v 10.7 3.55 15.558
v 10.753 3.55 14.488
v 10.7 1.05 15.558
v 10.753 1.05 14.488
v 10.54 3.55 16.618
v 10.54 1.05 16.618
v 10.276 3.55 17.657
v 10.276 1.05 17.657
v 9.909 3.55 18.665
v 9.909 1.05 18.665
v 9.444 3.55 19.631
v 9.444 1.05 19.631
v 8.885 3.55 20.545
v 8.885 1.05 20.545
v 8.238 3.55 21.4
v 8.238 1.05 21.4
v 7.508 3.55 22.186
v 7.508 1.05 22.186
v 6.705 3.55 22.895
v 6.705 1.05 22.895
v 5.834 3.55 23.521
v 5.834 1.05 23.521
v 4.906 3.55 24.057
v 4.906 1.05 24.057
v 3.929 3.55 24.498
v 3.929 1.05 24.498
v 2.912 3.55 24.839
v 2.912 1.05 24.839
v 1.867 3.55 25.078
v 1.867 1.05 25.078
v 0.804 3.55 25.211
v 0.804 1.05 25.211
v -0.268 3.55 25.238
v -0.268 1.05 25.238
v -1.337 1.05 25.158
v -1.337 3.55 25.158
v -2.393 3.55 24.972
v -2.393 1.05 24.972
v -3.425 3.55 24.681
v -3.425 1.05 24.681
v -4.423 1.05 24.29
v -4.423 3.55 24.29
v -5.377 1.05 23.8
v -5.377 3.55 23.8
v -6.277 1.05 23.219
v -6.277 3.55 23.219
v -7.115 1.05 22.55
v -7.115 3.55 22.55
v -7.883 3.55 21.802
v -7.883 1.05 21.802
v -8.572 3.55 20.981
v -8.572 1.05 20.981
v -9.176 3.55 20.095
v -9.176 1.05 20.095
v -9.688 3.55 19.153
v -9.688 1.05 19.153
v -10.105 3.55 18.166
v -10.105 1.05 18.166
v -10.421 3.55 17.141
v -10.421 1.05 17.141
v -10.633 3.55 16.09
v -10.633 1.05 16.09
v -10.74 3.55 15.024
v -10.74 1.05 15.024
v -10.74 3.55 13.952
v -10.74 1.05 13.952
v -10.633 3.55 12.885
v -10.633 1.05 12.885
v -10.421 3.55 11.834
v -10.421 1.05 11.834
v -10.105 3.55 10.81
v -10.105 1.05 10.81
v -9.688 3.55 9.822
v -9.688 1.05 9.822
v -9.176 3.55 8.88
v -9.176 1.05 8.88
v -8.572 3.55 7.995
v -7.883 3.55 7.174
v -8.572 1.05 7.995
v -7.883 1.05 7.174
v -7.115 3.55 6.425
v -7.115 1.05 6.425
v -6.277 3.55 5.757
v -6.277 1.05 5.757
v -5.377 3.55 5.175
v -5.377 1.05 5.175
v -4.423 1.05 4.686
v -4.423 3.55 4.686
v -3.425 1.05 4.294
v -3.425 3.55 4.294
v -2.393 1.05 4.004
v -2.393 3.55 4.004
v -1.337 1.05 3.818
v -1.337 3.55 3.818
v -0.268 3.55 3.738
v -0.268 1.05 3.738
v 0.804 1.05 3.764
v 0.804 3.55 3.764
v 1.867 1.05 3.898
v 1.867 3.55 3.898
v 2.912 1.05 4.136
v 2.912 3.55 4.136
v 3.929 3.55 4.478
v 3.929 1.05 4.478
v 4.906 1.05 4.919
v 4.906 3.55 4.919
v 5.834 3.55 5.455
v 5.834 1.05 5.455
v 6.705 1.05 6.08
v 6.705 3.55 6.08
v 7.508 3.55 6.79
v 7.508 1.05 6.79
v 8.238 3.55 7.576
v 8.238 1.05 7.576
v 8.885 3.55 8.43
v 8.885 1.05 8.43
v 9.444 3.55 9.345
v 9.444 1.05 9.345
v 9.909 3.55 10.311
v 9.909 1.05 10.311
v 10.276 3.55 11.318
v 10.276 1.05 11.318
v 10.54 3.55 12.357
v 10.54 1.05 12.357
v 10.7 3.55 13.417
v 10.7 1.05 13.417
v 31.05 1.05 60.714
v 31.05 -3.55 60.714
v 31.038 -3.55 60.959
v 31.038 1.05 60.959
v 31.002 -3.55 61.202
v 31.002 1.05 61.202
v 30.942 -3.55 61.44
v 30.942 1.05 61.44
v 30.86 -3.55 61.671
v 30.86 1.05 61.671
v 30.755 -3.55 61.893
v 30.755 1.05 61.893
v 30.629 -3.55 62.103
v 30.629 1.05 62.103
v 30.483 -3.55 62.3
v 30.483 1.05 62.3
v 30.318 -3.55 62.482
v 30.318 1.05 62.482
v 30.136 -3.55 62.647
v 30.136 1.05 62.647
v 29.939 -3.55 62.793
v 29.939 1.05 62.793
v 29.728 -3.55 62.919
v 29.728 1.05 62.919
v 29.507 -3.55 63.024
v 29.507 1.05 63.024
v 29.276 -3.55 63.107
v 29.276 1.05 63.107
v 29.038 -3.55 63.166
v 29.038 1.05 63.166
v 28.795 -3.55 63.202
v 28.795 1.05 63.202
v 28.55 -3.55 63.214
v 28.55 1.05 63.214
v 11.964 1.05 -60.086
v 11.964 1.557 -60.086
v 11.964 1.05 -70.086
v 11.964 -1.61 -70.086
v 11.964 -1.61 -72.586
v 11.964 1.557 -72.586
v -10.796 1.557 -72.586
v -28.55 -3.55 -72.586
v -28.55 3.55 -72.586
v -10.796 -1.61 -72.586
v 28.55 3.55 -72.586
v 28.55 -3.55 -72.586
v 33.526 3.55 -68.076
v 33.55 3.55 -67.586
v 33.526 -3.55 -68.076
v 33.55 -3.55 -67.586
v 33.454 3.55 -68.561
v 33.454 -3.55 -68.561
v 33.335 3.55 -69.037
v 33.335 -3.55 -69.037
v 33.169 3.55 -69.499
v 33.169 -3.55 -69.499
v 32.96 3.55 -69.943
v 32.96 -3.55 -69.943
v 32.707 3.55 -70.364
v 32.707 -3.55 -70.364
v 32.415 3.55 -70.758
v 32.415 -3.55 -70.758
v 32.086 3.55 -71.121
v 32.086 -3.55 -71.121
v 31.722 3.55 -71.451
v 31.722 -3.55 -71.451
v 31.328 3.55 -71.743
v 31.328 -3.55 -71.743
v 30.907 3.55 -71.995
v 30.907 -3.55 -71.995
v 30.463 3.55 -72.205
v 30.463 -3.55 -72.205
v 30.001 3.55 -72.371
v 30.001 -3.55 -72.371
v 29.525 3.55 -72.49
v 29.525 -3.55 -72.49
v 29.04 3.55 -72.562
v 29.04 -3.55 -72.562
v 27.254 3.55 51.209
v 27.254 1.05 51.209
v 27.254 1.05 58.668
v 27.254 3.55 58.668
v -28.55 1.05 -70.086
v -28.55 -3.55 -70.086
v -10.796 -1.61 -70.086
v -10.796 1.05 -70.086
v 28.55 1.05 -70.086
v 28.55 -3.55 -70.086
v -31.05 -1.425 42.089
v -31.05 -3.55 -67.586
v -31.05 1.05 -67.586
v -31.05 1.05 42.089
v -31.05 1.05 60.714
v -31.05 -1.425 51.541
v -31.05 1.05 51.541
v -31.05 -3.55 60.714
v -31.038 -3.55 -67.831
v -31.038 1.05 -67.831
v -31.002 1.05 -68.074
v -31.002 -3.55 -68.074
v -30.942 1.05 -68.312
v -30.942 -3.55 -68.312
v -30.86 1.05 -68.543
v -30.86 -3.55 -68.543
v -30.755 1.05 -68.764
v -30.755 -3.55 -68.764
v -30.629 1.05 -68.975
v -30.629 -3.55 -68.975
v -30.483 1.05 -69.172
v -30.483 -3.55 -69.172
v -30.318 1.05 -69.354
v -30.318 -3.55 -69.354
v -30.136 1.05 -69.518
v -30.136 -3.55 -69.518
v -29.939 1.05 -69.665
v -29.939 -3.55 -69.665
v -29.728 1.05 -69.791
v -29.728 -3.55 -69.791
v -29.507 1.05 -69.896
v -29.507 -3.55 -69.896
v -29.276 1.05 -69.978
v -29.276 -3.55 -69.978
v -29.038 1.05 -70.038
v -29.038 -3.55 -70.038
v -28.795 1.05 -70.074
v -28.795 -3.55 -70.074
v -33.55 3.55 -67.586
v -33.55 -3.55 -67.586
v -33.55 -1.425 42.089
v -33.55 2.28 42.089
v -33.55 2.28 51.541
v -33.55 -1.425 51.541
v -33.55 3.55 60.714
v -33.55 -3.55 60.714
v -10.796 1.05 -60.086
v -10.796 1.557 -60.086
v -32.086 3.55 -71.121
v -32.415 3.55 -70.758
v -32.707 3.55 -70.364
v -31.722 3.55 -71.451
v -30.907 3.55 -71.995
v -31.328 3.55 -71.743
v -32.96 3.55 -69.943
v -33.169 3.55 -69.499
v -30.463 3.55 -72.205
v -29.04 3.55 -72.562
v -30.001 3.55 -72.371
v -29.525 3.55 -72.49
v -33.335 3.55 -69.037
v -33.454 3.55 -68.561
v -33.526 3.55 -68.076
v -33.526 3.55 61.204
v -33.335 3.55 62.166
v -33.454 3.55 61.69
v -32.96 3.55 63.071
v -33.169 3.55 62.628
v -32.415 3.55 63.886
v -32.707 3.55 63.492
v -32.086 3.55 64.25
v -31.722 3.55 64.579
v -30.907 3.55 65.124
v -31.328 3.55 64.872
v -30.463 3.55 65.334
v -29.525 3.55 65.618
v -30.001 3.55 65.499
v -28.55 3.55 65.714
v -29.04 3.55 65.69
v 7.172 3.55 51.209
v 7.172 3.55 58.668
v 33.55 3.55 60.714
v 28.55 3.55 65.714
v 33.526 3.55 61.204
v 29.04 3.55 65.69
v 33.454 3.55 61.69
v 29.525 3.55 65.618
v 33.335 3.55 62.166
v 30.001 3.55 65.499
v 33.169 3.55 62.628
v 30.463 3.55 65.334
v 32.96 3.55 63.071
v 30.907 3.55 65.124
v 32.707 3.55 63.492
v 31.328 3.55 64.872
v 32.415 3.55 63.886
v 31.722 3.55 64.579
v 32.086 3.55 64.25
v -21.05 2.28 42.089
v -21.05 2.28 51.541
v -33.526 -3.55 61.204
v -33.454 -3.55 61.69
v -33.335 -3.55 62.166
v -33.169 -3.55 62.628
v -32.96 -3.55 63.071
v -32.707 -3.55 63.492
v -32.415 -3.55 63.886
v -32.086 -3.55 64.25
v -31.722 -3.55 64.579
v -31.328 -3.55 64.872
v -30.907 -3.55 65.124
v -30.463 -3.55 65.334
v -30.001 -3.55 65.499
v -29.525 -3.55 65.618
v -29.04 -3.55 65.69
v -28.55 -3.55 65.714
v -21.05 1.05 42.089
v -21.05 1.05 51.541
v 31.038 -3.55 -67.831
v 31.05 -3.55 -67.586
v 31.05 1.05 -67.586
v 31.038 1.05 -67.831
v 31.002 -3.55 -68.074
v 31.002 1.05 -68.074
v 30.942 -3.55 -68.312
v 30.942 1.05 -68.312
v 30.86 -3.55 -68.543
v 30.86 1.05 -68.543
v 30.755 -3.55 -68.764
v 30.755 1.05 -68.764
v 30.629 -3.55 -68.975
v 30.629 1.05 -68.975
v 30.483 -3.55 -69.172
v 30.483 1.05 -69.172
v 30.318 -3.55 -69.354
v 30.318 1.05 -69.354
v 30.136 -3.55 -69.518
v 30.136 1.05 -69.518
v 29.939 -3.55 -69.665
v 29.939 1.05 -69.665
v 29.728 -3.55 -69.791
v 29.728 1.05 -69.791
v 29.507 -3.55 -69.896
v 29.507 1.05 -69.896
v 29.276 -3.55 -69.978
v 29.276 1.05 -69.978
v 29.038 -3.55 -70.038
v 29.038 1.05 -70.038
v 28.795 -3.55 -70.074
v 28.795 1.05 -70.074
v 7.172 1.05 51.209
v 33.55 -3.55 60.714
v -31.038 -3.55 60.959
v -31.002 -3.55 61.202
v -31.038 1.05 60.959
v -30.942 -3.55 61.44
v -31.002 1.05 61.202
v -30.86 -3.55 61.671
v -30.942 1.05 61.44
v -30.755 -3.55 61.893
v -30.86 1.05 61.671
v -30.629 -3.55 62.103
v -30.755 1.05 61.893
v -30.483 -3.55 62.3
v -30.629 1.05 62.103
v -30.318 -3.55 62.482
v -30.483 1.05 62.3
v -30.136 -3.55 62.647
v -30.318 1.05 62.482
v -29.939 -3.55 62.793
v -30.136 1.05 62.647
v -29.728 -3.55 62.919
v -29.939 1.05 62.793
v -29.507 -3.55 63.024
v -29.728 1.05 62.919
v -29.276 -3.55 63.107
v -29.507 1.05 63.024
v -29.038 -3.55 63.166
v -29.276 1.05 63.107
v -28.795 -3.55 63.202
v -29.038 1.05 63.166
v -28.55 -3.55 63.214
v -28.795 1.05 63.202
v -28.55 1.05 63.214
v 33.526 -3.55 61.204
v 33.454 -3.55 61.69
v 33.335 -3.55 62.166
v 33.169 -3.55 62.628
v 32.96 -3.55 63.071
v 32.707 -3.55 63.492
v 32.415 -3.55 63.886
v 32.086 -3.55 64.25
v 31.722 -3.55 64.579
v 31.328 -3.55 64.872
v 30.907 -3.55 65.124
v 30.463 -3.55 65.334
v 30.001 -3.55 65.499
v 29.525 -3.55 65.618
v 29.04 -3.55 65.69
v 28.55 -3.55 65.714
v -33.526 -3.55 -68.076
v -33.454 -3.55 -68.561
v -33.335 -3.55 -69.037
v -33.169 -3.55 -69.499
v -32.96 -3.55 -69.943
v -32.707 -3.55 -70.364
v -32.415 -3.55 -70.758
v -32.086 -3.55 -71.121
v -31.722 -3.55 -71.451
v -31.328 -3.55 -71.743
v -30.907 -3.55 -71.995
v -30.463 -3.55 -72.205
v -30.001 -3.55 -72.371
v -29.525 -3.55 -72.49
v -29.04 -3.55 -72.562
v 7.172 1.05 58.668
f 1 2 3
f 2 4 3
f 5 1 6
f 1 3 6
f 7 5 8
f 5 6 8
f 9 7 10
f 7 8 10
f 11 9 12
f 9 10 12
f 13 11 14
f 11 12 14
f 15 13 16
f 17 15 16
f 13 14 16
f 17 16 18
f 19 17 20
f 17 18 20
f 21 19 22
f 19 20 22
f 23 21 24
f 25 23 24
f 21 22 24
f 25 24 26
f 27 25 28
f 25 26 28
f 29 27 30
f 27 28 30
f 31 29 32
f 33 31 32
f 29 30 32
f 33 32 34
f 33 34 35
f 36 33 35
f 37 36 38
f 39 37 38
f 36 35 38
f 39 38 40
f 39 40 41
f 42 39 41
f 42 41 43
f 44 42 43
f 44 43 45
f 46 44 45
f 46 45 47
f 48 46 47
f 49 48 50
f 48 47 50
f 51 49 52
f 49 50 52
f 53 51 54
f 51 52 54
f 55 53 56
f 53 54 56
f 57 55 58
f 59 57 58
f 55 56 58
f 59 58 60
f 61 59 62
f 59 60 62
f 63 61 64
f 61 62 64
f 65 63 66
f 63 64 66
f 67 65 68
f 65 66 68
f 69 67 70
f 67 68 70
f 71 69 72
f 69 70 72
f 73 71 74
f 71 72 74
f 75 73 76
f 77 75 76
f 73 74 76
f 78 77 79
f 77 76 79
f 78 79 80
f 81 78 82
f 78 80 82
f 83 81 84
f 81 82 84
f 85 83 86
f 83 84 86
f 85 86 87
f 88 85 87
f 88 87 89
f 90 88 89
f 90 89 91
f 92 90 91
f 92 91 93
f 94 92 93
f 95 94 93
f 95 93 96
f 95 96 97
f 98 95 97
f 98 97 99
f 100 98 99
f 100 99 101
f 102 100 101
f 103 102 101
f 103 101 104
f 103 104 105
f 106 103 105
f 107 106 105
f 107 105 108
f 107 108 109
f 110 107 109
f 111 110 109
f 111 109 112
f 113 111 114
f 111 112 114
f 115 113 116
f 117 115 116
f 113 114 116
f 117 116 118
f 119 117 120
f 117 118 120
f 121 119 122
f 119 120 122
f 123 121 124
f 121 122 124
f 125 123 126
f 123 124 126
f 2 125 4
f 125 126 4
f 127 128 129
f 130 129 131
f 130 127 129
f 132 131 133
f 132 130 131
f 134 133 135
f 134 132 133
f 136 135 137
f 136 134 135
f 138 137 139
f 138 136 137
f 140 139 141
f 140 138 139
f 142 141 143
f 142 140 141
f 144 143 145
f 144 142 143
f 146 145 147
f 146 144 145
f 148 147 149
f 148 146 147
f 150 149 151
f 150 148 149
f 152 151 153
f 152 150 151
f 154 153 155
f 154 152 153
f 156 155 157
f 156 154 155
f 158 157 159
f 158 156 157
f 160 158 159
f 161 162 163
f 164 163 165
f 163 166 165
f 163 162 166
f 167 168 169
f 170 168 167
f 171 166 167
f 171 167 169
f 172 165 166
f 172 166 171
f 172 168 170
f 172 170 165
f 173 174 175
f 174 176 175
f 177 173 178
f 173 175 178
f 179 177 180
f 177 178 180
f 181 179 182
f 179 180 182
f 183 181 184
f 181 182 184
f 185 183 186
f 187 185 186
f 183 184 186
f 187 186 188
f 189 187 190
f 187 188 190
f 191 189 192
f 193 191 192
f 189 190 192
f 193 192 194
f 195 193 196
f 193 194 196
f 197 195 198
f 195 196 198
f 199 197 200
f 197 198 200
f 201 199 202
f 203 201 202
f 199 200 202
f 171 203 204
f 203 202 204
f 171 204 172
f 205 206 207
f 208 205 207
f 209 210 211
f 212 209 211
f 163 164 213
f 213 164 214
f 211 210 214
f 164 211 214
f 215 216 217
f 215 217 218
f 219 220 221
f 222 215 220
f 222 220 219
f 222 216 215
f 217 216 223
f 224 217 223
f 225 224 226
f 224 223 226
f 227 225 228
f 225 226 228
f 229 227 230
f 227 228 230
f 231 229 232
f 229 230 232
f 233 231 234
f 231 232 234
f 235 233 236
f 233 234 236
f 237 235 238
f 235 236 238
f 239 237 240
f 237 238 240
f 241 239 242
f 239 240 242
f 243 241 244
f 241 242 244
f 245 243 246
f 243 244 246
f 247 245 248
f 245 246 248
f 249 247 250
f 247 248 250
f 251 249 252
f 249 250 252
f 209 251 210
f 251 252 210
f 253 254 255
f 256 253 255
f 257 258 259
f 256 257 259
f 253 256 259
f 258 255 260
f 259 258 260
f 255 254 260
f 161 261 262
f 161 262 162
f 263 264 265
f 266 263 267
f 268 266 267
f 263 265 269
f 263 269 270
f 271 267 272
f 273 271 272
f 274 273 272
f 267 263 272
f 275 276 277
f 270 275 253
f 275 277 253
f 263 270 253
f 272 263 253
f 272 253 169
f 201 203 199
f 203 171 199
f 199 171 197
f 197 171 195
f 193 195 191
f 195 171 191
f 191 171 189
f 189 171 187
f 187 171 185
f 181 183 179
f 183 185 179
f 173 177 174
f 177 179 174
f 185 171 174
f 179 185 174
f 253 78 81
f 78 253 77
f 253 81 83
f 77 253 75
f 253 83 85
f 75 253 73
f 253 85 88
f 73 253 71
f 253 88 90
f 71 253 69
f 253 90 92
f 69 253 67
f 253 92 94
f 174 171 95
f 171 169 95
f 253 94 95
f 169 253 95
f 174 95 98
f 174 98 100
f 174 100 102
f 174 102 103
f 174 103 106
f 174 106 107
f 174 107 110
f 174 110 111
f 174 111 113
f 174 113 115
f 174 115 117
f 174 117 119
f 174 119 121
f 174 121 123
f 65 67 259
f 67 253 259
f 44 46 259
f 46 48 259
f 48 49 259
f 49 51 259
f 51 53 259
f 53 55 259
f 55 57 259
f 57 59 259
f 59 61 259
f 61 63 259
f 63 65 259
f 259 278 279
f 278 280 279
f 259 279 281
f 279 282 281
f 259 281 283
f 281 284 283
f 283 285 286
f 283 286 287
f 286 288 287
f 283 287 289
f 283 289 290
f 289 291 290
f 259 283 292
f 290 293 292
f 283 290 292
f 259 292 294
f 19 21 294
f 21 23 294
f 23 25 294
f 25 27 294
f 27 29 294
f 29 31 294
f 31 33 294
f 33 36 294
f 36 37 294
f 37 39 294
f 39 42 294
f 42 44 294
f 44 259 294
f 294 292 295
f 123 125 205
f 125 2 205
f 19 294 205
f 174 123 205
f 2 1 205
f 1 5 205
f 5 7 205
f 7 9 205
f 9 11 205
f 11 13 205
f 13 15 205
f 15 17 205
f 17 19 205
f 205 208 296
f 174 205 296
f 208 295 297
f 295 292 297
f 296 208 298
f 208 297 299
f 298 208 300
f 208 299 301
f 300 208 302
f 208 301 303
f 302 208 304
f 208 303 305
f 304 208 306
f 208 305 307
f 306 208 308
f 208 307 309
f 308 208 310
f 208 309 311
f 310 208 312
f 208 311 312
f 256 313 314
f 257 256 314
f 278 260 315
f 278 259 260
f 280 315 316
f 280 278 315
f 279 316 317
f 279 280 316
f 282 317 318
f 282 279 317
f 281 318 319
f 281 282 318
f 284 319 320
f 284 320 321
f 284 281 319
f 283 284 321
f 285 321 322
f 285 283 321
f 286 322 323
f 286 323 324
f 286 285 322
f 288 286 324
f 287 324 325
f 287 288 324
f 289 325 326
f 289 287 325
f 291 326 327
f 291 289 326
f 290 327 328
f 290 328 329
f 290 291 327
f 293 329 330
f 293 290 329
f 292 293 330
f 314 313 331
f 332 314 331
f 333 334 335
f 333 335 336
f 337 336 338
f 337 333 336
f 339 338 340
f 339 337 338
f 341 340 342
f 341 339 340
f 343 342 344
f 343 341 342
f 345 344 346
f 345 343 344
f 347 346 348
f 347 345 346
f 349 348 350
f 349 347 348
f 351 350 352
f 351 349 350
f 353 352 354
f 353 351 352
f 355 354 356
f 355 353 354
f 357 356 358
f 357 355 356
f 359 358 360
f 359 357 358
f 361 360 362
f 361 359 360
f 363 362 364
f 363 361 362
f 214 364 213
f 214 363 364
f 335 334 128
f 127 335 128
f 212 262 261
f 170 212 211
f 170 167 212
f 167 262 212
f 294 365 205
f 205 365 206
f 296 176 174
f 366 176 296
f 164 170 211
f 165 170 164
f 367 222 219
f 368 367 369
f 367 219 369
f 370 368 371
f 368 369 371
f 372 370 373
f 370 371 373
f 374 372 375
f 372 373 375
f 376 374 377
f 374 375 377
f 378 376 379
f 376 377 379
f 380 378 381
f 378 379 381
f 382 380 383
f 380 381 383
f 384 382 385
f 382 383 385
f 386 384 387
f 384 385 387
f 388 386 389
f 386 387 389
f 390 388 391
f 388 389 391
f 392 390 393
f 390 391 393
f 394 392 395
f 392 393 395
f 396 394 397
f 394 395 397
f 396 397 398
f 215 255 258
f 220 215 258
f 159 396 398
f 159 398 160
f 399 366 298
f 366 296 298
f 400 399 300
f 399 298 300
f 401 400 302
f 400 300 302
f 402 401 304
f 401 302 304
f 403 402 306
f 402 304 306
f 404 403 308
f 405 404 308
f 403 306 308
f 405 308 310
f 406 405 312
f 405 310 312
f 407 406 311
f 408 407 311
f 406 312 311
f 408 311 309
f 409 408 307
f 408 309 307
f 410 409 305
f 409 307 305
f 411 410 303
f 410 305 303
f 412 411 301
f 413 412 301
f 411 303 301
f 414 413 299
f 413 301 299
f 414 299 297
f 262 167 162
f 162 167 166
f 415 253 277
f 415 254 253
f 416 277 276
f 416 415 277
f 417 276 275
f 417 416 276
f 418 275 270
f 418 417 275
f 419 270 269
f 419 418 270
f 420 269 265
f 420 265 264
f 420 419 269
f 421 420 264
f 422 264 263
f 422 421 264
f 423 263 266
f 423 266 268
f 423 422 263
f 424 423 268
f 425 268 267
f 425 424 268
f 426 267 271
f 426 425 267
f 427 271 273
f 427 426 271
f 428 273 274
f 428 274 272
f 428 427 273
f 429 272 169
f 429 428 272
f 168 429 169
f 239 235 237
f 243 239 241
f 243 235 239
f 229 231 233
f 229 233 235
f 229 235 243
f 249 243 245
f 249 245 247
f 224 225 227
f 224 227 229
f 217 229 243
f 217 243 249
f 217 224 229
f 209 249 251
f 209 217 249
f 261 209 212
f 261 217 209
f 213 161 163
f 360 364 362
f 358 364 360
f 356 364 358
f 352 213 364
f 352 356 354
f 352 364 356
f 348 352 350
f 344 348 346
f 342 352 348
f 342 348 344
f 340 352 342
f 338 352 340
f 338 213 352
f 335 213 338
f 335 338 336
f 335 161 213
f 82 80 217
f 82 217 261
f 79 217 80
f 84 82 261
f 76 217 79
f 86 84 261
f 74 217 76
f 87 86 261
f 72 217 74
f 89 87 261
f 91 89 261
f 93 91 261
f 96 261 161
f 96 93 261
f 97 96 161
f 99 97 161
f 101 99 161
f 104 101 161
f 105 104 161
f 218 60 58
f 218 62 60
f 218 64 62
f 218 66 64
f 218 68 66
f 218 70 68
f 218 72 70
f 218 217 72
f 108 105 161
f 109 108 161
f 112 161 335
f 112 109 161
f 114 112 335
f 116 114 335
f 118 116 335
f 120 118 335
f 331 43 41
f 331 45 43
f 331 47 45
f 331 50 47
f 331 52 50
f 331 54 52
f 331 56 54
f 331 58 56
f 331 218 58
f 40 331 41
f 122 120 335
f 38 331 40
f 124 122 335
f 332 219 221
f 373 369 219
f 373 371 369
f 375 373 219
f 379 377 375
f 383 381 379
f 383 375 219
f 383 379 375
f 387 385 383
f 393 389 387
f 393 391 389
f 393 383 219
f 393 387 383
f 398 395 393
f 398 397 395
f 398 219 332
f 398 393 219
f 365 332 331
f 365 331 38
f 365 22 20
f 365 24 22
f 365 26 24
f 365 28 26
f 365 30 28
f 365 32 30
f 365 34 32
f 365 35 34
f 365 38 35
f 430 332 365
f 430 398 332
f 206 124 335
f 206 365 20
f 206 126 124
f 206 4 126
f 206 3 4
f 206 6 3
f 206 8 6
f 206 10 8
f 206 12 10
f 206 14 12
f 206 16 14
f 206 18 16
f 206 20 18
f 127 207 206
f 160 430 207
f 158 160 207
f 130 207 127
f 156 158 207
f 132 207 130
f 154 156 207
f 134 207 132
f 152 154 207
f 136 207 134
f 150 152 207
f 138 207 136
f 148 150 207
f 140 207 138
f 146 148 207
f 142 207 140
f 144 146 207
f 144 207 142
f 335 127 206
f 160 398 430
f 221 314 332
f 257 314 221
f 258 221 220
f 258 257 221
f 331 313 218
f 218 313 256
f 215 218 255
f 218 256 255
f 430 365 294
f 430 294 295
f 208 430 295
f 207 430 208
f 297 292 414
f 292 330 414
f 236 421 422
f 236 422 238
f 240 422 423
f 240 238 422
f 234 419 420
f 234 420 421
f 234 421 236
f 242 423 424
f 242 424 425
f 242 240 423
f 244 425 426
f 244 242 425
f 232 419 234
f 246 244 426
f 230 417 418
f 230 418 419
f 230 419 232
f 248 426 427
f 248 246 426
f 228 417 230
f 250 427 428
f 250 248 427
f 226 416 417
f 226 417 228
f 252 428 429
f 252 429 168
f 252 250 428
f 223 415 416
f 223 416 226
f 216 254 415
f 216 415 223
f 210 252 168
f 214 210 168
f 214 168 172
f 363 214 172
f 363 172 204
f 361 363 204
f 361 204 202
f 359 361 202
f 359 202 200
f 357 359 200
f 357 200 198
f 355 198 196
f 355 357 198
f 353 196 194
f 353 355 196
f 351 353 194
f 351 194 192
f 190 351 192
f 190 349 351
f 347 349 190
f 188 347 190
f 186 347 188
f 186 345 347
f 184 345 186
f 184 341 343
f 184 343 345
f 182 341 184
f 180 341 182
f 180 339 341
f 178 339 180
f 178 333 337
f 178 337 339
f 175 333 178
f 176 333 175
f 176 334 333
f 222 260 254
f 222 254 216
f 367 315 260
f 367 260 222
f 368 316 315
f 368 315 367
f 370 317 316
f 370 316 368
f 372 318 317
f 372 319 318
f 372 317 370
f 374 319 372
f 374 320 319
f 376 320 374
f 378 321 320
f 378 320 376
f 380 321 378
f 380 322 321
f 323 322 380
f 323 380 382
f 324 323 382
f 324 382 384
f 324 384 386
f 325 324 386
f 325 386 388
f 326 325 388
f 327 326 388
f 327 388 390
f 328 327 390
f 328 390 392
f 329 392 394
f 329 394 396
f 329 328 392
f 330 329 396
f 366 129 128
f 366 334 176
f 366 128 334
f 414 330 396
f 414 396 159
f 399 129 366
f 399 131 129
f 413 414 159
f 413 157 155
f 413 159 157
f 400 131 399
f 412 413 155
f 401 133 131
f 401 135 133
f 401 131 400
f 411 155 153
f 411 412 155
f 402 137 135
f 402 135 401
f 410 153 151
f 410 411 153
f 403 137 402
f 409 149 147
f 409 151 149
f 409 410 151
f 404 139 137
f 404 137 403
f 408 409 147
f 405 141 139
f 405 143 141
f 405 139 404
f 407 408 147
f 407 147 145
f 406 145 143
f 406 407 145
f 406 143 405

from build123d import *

# Parameters (mm, degrees)
F0_W      = 67.1
F0_H      = 138.3
F1_DEPTH  = 3.55
F2_R      = 5
F3_T      = -2.5
F4_W      = 20.0819657184
F4_H      = 7.4590183794
F5_DEPTH  = 12.5
F7_R      = 10.7534144168
F8_DEPTH  = 12.5
F6_W      = 22.7594478056
F6_H      = 3.1675179489
F9_DEPTH  = 12.5
F10_W     = 3.7042096956
F10_H     = 9.4521231949
F11_DEPTH = 12.5


with BuildPart() as f1:
    # F0 (on Front) → F1 (new body, symmetric)
    with BuildSketch(Plane.XZ):
        with Locations((0, -3.435843619)):
            Rectangle(F0_W, F0_H)
    extrude(amount=F1_DEPTH, both=True)

    # F2
    f2_edges = [f1.edges().sort_by_distance(p)[0] for p in [
        (33.55, 0, 65.714156),
        (33.55, 0, -72.585844),
        (-33.55, 0, -72.585844),
        (-33.55, 0, 65.714156),
    ]]
    fillet(f2_edges, radius=F2_R)

    # F3
    f3_openings = [f1.faces().sort_by_distance(p)[0] for p in [
        (0, -3.55, -3.435844),
    ]]
    offset(amount=F3_T, openings=f3_openings)

    # F4 (on face) → F5 (cut, symmetric)
    with BuildSketch(Plane.XZ.offset(-1.05)):
        with Locations((17.2131143045, 54.9385268241)):
            Rectangle(F4_W, F4_H)
    extrude(amount=F5_DEPTH, both=True, mode=Mode.SUBTRACT)

    # F7 (on face) → F8 (cut, symmetric)
    with BuildSketch(Plane.XZ.offset(-1.05)):
        with Locations((0, 14.4877051935)):
            Circle(F7_R)
    extrude(amount=F8_DEPTH, both=True, mode=Mode.SUBTRACT)

    # F6 (on face) → F9 (cut, symmetric)
    with BuildSketch(Plane(origin=(0, 0, -72.585843619), x_dir=(1, 0, 0), z_dir=(0, 0, -1))):
        with Locations((0.5839481018, 0.0267331488)):
            Rectangle(F6_W, F6_H)
    extrude(amount=F9_DEPTH, both=True, mode=Mode.SUBTRACT)

    # F10 (on face) → F11 (cut, symmetric)
    with BuildSketch(Plane(origin=(-33.55, 0, 0), x_dir=(0, -1, 0), z_dir=(-1, 0, 0))):
        with Locations((-0.4275311367, 46.8149799854)):
            Rectangle(F10_W, F10_H)
    extrude(amount=F11_DEPTH, both=True, mode=Mode.SUBTRACT)


solid = f1.part
